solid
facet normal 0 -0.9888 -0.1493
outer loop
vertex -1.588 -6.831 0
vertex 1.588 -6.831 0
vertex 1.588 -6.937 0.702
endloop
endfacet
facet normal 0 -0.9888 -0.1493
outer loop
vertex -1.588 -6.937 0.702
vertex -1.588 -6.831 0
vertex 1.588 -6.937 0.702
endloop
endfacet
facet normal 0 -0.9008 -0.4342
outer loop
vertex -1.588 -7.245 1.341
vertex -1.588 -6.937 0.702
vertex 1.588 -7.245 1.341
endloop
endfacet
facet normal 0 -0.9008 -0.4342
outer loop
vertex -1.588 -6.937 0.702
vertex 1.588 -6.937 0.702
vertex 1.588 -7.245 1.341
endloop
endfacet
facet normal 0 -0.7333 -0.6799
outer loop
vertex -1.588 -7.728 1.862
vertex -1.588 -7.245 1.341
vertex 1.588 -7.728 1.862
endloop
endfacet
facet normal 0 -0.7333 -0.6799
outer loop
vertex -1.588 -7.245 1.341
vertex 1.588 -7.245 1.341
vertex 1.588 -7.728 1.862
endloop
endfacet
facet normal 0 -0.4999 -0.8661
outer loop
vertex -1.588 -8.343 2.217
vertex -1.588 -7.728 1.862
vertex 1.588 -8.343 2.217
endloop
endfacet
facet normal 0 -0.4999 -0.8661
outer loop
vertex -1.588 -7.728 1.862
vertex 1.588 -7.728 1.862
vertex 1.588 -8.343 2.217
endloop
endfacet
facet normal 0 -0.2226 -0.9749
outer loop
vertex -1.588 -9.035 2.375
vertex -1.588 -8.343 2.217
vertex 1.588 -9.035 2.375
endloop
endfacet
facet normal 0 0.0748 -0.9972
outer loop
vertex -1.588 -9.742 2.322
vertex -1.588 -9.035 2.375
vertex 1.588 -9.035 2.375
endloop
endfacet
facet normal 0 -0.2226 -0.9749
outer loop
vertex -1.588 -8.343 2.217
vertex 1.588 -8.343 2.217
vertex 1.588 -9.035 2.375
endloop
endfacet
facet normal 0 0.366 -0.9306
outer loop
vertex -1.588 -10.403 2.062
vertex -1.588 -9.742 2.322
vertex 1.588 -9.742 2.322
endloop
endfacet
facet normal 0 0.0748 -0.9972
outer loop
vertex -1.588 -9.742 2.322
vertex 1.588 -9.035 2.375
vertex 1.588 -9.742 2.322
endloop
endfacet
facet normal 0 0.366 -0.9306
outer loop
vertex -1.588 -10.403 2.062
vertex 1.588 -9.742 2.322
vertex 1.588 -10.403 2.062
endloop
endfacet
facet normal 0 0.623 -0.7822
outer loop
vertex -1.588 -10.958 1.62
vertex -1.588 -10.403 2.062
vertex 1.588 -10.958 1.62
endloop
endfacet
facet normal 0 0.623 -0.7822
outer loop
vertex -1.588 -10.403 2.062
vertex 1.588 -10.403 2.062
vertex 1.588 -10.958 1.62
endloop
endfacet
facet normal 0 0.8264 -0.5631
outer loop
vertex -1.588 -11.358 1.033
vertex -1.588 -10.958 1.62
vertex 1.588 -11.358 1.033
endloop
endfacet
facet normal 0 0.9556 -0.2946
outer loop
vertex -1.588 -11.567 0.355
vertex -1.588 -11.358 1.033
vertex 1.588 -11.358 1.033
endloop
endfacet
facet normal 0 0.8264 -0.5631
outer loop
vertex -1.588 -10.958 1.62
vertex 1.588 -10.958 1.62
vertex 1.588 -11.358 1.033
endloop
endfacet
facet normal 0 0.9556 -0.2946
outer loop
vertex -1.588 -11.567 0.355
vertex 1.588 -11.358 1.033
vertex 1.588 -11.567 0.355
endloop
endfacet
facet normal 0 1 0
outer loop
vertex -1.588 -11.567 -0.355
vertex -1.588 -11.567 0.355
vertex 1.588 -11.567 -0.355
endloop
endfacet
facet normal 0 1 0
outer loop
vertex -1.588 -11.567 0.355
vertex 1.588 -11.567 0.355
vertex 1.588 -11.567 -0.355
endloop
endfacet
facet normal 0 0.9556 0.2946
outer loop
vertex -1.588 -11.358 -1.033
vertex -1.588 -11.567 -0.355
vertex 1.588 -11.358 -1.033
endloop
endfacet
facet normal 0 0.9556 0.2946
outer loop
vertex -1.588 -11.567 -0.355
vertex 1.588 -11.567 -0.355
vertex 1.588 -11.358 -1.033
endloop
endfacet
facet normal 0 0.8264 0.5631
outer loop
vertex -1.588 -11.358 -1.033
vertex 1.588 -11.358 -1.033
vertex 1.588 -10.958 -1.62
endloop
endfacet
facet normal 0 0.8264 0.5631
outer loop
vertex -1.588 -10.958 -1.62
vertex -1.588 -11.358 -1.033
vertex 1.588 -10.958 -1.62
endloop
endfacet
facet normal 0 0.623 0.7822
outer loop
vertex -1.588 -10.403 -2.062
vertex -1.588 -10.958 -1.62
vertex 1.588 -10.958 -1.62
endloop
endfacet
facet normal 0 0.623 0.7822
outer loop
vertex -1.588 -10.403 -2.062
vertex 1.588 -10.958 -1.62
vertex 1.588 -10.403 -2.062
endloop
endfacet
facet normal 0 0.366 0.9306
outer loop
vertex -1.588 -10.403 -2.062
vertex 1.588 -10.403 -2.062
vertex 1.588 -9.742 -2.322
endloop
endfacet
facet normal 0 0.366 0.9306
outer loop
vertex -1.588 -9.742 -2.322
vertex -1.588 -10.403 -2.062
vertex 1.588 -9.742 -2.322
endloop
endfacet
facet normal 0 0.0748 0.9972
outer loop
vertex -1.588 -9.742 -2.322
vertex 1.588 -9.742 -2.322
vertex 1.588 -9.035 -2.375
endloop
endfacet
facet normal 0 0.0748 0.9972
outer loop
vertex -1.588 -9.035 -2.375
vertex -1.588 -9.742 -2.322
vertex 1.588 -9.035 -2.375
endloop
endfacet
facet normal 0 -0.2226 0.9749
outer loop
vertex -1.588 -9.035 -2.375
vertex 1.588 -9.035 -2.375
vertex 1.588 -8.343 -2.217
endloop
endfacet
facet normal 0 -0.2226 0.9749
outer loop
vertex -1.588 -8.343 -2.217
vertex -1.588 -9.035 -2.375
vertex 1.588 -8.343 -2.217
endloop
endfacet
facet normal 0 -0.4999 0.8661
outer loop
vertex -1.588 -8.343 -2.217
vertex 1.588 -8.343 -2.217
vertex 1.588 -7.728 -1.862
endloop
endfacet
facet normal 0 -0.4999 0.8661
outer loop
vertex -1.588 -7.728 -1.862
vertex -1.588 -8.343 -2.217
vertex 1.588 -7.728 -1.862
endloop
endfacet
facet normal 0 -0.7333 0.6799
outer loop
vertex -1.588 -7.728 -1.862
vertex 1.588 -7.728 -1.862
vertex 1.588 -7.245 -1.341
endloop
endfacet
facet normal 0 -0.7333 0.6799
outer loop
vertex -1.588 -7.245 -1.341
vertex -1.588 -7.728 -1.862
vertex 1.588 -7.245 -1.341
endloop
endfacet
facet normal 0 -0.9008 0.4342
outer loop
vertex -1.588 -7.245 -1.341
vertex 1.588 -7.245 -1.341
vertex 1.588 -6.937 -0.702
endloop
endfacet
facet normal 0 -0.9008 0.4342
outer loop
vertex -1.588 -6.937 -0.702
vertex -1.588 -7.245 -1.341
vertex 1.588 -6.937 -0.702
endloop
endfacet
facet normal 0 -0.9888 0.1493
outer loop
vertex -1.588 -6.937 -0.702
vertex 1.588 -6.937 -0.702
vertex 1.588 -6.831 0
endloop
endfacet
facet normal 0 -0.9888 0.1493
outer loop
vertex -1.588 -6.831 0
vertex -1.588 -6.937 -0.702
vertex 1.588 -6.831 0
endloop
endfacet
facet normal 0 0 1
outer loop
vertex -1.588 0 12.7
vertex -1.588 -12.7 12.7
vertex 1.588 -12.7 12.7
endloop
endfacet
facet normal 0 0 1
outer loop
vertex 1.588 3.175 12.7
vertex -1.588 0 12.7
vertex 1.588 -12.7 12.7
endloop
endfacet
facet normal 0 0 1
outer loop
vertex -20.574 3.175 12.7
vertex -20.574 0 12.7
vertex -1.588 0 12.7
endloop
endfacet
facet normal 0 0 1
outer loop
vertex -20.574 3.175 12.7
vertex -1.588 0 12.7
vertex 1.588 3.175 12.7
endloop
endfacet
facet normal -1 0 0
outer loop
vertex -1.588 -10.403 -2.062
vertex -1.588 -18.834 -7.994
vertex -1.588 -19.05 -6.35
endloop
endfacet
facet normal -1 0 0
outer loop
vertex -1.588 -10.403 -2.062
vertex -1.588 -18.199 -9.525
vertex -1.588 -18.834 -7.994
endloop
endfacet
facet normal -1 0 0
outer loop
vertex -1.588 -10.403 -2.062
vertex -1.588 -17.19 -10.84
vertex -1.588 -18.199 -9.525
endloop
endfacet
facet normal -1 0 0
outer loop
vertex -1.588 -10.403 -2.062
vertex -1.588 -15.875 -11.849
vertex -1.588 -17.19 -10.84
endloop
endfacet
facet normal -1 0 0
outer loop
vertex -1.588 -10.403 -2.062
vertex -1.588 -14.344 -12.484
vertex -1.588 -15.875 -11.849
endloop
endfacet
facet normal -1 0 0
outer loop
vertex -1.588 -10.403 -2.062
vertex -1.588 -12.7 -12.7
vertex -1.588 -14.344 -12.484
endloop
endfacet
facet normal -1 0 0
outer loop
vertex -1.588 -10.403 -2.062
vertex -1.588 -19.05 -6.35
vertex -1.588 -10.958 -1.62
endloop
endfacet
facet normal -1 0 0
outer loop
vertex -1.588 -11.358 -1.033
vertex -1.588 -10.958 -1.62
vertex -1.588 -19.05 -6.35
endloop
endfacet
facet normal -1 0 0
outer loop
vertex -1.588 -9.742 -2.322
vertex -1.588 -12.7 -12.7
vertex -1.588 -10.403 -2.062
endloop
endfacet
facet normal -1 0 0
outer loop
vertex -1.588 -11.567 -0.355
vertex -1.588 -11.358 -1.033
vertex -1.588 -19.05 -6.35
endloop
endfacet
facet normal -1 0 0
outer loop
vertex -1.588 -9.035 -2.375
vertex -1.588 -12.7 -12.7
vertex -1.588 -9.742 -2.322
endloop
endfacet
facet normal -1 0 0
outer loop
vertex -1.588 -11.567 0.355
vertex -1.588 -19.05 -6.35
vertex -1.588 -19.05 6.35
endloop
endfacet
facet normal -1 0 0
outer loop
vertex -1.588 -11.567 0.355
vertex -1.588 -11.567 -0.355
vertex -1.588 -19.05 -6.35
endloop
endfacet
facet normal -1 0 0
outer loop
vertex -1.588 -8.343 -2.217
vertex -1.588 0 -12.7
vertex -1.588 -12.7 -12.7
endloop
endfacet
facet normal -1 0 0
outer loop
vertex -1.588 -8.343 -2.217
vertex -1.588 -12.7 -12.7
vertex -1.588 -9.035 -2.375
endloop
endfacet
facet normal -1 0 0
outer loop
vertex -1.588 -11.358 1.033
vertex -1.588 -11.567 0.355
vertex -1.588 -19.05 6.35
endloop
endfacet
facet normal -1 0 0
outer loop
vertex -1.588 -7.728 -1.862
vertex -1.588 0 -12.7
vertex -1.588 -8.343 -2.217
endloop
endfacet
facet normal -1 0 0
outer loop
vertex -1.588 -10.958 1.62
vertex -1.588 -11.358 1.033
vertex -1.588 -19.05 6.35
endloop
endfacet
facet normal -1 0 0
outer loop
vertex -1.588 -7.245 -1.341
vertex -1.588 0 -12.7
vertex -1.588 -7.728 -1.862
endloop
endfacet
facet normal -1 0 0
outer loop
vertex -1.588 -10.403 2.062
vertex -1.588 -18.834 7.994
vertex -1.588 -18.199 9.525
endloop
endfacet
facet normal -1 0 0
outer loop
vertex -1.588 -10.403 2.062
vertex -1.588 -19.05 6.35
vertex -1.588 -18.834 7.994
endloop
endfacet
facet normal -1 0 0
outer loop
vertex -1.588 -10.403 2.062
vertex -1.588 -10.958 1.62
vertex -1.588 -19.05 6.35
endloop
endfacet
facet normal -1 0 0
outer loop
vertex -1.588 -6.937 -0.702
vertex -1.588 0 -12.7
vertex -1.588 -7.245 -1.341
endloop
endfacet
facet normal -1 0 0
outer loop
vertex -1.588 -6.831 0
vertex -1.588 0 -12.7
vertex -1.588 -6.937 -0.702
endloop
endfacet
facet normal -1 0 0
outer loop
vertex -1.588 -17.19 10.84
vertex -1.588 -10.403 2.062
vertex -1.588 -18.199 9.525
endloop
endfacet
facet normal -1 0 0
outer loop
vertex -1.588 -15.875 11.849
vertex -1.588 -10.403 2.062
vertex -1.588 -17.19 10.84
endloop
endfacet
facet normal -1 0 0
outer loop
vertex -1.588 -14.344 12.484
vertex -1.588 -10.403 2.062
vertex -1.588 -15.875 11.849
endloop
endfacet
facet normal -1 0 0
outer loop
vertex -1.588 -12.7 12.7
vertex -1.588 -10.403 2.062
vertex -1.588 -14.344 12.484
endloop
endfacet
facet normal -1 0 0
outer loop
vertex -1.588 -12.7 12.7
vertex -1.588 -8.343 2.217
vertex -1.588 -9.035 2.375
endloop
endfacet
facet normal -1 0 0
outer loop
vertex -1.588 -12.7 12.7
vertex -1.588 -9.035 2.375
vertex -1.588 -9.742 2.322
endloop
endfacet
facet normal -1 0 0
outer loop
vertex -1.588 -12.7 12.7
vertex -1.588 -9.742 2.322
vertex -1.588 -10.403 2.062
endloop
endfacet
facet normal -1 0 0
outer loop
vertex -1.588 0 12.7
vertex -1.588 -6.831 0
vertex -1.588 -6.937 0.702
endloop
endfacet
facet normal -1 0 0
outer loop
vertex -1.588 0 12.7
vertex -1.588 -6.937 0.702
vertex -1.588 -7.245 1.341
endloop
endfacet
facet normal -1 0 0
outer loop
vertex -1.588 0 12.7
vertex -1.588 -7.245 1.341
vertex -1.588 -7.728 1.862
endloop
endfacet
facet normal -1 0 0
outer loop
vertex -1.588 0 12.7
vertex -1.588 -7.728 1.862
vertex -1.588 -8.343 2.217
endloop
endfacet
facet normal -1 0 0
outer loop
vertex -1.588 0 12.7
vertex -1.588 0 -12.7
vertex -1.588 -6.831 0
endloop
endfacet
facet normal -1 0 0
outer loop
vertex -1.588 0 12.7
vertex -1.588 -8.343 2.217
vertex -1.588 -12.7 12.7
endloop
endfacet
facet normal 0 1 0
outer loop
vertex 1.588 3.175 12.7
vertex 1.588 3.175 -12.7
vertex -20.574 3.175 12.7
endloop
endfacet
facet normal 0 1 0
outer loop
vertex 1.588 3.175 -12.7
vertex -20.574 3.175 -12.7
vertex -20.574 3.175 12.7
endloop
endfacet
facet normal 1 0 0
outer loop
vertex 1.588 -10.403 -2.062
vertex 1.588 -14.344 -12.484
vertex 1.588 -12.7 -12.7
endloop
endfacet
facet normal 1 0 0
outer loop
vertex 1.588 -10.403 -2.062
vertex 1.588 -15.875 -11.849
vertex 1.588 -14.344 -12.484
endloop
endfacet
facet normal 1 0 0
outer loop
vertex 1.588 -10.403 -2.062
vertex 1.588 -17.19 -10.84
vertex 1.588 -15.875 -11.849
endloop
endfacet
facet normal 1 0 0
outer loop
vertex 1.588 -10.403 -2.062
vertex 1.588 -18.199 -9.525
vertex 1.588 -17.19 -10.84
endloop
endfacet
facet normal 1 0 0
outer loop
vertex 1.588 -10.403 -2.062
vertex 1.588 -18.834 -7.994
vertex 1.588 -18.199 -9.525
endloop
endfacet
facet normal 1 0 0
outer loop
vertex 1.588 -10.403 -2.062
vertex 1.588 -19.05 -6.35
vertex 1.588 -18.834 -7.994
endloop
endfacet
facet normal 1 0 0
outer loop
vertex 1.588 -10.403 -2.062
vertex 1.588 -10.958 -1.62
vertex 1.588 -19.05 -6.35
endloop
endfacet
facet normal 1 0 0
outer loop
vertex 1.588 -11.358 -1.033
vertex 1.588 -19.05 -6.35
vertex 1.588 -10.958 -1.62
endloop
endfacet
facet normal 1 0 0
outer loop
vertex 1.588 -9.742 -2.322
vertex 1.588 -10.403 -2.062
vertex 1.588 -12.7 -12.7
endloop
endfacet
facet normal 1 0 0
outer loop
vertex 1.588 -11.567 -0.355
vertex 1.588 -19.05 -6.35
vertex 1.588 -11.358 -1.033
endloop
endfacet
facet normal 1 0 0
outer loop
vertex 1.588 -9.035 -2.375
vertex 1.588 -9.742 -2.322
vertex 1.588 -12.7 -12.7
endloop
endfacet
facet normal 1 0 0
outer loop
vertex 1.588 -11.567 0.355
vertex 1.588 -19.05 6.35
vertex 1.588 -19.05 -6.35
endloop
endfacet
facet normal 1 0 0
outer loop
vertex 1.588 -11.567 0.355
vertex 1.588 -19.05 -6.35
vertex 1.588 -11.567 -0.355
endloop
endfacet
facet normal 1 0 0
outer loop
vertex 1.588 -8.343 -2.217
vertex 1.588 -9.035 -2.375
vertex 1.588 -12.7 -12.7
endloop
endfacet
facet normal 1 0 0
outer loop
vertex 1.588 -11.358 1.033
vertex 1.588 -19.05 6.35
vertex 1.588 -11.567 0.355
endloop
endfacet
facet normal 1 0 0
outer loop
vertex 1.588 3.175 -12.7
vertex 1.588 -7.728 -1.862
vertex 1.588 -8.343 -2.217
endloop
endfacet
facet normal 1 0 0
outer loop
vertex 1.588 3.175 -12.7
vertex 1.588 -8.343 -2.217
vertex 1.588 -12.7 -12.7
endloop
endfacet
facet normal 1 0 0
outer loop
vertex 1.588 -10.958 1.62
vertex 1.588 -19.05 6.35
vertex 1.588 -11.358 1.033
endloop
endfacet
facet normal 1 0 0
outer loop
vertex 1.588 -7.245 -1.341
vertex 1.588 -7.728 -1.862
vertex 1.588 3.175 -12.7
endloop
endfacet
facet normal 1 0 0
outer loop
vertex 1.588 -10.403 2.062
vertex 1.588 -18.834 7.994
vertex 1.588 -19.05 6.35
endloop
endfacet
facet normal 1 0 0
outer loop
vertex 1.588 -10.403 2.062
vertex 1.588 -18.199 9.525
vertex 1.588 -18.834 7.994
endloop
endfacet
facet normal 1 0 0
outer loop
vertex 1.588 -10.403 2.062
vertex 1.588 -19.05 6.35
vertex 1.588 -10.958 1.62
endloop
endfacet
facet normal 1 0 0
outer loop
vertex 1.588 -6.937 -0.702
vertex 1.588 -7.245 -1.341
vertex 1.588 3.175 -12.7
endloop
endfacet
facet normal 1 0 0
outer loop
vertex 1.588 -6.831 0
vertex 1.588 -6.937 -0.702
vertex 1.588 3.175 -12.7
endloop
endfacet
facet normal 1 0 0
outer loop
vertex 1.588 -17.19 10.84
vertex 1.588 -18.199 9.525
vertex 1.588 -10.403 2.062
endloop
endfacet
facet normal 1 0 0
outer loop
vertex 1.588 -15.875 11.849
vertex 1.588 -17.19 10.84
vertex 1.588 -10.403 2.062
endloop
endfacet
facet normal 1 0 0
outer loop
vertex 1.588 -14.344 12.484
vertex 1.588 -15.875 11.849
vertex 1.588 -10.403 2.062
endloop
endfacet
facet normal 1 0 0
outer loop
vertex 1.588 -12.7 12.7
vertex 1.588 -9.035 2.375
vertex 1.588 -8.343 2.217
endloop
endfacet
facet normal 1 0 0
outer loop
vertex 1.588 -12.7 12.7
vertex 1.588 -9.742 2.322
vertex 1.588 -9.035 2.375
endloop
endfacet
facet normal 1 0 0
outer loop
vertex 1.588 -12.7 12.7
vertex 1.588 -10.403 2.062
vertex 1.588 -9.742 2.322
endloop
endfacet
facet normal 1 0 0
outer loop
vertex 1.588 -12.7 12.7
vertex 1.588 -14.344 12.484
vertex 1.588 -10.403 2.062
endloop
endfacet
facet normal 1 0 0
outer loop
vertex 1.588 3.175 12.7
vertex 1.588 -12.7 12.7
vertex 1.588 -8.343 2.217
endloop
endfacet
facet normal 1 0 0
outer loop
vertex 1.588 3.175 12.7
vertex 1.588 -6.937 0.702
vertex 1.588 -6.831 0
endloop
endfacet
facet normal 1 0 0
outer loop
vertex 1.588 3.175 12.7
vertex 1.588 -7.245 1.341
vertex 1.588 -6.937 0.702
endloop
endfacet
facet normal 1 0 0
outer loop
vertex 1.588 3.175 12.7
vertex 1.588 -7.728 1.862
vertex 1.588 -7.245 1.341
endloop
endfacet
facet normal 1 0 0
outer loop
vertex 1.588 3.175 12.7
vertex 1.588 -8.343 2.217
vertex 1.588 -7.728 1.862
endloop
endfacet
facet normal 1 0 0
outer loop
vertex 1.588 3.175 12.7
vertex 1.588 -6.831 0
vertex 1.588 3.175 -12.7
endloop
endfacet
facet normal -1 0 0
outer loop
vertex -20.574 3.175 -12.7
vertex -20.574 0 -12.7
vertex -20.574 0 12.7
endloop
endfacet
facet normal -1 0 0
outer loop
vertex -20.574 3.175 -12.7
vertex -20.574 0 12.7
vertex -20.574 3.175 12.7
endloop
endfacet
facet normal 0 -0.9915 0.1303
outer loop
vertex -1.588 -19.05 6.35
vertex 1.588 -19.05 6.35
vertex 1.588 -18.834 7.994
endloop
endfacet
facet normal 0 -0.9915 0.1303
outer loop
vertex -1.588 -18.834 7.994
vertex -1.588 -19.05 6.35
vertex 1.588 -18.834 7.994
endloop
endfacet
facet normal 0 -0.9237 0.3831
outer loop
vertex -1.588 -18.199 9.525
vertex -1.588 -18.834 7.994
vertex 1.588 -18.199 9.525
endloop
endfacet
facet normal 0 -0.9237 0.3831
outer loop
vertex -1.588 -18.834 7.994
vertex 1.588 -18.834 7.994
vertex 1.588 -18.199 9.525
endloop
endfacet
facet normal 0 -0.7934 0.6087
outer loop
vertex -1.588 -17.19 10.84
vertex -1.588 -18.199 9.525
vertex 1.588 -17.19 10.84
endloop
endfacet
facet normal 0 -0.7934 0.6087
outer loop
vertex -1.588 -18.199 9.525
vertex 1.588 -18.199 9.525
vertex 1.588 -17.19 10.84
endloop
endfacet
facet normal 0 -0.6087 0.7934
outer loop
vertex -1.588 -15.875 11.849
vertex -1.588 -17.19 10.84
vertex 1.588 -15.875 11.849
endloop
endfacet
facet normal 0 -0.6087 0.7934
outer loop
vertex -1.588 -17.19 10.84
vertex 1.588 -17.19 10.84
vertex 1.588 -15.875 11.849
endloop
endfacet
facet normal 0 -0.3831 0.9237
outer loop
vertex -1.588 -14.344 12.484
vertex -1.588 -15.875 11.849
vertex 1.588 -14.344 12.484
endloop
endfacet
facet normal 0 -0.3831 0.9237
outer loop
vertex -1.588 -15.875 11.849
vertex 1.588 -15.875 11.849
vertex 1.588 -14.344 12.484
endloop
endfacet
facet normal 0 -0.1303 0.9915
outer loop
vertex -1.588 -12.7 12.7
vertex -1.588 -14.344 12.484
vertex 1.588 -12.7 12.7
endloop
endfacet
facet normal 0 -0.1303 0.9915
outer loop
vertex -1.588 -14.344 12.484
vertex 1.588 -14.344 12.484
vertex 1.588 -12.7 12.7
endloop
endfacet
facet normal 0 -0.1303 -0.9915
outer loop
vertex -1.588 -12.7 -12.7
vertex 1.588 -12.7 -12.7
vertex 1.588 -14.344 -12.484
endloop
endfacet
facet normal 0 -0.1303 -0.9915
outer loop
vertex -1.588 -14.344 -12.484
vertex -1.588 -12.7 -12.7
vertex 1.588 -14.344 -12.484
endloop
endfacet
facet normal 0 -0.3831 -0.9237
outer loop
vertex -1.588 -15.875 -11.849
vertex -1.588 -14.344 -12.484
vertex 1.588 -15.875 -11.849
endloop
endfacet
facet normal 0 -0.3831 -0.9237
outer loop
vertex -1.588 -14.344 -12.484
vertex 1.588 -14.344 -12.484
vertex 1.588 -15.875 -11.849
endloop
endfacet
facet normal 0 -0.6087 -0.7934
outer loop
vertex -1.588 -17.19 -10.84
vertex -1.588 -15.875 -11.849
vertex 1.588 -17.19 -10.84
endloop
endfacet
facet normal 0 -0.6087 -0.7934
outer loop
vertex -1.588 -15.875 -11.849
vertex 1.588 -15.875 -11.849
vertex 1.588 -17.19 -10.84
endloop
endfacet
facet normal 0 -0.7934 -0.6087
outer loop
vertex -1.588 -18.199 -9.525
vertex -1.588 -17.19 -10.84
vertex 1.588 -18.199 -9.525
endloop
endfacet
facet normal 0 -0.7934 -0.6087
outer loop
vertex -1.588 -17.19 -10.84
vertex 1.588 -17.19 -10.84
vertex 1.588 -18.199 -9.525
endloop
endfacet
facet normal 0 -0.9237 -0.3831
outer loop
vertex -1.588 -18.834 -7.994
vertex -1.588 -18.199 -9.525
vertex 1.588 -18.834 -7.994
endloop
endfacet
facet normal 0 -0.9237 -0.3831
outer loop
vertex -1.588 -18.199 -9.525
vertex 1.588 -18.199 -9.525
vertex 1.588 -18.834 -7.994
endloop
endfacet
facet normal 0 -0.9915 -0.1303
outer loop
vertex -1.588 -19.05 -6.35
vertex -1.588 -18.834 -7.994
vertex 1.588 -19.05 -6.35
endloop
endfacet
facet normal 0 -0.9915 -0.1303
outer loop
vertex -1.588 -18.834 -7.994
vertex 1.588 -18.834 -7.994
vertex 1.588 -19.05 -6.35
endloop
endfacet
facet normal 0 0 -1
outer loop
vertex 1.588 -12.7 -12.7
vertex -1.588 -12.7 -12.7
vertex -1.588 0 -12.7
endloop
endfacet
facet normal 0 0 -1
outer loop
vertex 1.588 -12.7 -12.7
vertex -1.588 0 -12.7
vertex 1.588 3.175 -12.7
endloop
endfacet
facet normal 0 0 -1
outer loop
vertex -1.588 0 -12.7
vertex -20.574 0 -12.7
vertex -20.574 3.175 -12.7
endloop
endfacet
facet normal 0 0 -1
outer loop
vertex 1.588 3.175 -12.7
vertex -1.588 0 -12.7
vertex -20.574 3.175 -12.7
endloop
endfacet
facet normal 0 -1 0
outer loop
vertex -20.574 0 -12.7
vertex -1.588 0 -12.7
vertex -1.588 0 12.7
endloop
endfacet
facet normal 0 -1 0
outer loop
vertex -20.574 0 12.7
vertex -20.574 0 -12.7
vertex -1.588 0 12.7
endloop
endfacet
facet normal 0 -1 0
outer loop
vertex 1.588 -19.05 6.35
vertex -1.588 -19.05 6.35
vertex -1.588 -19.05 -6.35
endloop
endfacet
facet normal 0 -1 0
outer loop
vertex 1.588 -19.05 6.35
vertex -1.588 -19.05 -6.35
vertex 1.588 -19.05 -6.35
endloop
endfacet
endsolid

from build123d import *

# Parameters (mm, degrees)
F0_W          = 3.175
F0_H          = 25.4
F1_DEPTH      = 19.05
F2_R          = 2.38125
F3_DEPTH      = 25.4
F4_W          = 3.175
F4_H          = 25.4
F5_DEPTH      = 20.574
F5_DEPTH_BACK = 1.5875


with BuildPart() as f1:
    # F0 (on Front) → F1 (new body)
    with BuildSketch(Plane.XZ):
        Rectangle(F0_W, F0_H)
    extrude(amount=F1_DEPTH)

    # F2 (on face) → F3 (cut)
    with BuildSketch(Plane.YZ.offset(1.5875)):
        with BuildLine():
            ThreePointArc((-19.05, 6.35), (-17.1901280605, 10.8401280605), (-12.7, 12.7))
            Line((-12.7, 12.7), (-19.05, 12.7))
            Line((-19.05, 12.7), (-19.05, 6.35))
        make_face()
        with BuildLine():
            ThreePointArc((-12.7, -12.7), (-17.1901280605, -10.8401280605), (-19.05, -6.35))
            Line((-19.05, -6.35), (-19.05, -12.7))
            Line((-19.05, -12.7), (-12.7, -12.7))
        make_face()
        with Locations((-9.212619625, 0)):
            Circle(F2_R)
    extrude(amount=-F3_DEPTH, mode=Mode.SUBTRACT)

    # F4 (on Right) → F5 (join, two sides)
    with BuildSketch(Plane.YZ) as f5_sk:
        with Locations((1.5875, 0)):
            Rectangle(F4_W, F4_H)
    extrude(amount=-F5_DEPTH)
    extrude(f5_sk.sketch, amount=F5_DEPTH_BACK)


solid = f1.part
